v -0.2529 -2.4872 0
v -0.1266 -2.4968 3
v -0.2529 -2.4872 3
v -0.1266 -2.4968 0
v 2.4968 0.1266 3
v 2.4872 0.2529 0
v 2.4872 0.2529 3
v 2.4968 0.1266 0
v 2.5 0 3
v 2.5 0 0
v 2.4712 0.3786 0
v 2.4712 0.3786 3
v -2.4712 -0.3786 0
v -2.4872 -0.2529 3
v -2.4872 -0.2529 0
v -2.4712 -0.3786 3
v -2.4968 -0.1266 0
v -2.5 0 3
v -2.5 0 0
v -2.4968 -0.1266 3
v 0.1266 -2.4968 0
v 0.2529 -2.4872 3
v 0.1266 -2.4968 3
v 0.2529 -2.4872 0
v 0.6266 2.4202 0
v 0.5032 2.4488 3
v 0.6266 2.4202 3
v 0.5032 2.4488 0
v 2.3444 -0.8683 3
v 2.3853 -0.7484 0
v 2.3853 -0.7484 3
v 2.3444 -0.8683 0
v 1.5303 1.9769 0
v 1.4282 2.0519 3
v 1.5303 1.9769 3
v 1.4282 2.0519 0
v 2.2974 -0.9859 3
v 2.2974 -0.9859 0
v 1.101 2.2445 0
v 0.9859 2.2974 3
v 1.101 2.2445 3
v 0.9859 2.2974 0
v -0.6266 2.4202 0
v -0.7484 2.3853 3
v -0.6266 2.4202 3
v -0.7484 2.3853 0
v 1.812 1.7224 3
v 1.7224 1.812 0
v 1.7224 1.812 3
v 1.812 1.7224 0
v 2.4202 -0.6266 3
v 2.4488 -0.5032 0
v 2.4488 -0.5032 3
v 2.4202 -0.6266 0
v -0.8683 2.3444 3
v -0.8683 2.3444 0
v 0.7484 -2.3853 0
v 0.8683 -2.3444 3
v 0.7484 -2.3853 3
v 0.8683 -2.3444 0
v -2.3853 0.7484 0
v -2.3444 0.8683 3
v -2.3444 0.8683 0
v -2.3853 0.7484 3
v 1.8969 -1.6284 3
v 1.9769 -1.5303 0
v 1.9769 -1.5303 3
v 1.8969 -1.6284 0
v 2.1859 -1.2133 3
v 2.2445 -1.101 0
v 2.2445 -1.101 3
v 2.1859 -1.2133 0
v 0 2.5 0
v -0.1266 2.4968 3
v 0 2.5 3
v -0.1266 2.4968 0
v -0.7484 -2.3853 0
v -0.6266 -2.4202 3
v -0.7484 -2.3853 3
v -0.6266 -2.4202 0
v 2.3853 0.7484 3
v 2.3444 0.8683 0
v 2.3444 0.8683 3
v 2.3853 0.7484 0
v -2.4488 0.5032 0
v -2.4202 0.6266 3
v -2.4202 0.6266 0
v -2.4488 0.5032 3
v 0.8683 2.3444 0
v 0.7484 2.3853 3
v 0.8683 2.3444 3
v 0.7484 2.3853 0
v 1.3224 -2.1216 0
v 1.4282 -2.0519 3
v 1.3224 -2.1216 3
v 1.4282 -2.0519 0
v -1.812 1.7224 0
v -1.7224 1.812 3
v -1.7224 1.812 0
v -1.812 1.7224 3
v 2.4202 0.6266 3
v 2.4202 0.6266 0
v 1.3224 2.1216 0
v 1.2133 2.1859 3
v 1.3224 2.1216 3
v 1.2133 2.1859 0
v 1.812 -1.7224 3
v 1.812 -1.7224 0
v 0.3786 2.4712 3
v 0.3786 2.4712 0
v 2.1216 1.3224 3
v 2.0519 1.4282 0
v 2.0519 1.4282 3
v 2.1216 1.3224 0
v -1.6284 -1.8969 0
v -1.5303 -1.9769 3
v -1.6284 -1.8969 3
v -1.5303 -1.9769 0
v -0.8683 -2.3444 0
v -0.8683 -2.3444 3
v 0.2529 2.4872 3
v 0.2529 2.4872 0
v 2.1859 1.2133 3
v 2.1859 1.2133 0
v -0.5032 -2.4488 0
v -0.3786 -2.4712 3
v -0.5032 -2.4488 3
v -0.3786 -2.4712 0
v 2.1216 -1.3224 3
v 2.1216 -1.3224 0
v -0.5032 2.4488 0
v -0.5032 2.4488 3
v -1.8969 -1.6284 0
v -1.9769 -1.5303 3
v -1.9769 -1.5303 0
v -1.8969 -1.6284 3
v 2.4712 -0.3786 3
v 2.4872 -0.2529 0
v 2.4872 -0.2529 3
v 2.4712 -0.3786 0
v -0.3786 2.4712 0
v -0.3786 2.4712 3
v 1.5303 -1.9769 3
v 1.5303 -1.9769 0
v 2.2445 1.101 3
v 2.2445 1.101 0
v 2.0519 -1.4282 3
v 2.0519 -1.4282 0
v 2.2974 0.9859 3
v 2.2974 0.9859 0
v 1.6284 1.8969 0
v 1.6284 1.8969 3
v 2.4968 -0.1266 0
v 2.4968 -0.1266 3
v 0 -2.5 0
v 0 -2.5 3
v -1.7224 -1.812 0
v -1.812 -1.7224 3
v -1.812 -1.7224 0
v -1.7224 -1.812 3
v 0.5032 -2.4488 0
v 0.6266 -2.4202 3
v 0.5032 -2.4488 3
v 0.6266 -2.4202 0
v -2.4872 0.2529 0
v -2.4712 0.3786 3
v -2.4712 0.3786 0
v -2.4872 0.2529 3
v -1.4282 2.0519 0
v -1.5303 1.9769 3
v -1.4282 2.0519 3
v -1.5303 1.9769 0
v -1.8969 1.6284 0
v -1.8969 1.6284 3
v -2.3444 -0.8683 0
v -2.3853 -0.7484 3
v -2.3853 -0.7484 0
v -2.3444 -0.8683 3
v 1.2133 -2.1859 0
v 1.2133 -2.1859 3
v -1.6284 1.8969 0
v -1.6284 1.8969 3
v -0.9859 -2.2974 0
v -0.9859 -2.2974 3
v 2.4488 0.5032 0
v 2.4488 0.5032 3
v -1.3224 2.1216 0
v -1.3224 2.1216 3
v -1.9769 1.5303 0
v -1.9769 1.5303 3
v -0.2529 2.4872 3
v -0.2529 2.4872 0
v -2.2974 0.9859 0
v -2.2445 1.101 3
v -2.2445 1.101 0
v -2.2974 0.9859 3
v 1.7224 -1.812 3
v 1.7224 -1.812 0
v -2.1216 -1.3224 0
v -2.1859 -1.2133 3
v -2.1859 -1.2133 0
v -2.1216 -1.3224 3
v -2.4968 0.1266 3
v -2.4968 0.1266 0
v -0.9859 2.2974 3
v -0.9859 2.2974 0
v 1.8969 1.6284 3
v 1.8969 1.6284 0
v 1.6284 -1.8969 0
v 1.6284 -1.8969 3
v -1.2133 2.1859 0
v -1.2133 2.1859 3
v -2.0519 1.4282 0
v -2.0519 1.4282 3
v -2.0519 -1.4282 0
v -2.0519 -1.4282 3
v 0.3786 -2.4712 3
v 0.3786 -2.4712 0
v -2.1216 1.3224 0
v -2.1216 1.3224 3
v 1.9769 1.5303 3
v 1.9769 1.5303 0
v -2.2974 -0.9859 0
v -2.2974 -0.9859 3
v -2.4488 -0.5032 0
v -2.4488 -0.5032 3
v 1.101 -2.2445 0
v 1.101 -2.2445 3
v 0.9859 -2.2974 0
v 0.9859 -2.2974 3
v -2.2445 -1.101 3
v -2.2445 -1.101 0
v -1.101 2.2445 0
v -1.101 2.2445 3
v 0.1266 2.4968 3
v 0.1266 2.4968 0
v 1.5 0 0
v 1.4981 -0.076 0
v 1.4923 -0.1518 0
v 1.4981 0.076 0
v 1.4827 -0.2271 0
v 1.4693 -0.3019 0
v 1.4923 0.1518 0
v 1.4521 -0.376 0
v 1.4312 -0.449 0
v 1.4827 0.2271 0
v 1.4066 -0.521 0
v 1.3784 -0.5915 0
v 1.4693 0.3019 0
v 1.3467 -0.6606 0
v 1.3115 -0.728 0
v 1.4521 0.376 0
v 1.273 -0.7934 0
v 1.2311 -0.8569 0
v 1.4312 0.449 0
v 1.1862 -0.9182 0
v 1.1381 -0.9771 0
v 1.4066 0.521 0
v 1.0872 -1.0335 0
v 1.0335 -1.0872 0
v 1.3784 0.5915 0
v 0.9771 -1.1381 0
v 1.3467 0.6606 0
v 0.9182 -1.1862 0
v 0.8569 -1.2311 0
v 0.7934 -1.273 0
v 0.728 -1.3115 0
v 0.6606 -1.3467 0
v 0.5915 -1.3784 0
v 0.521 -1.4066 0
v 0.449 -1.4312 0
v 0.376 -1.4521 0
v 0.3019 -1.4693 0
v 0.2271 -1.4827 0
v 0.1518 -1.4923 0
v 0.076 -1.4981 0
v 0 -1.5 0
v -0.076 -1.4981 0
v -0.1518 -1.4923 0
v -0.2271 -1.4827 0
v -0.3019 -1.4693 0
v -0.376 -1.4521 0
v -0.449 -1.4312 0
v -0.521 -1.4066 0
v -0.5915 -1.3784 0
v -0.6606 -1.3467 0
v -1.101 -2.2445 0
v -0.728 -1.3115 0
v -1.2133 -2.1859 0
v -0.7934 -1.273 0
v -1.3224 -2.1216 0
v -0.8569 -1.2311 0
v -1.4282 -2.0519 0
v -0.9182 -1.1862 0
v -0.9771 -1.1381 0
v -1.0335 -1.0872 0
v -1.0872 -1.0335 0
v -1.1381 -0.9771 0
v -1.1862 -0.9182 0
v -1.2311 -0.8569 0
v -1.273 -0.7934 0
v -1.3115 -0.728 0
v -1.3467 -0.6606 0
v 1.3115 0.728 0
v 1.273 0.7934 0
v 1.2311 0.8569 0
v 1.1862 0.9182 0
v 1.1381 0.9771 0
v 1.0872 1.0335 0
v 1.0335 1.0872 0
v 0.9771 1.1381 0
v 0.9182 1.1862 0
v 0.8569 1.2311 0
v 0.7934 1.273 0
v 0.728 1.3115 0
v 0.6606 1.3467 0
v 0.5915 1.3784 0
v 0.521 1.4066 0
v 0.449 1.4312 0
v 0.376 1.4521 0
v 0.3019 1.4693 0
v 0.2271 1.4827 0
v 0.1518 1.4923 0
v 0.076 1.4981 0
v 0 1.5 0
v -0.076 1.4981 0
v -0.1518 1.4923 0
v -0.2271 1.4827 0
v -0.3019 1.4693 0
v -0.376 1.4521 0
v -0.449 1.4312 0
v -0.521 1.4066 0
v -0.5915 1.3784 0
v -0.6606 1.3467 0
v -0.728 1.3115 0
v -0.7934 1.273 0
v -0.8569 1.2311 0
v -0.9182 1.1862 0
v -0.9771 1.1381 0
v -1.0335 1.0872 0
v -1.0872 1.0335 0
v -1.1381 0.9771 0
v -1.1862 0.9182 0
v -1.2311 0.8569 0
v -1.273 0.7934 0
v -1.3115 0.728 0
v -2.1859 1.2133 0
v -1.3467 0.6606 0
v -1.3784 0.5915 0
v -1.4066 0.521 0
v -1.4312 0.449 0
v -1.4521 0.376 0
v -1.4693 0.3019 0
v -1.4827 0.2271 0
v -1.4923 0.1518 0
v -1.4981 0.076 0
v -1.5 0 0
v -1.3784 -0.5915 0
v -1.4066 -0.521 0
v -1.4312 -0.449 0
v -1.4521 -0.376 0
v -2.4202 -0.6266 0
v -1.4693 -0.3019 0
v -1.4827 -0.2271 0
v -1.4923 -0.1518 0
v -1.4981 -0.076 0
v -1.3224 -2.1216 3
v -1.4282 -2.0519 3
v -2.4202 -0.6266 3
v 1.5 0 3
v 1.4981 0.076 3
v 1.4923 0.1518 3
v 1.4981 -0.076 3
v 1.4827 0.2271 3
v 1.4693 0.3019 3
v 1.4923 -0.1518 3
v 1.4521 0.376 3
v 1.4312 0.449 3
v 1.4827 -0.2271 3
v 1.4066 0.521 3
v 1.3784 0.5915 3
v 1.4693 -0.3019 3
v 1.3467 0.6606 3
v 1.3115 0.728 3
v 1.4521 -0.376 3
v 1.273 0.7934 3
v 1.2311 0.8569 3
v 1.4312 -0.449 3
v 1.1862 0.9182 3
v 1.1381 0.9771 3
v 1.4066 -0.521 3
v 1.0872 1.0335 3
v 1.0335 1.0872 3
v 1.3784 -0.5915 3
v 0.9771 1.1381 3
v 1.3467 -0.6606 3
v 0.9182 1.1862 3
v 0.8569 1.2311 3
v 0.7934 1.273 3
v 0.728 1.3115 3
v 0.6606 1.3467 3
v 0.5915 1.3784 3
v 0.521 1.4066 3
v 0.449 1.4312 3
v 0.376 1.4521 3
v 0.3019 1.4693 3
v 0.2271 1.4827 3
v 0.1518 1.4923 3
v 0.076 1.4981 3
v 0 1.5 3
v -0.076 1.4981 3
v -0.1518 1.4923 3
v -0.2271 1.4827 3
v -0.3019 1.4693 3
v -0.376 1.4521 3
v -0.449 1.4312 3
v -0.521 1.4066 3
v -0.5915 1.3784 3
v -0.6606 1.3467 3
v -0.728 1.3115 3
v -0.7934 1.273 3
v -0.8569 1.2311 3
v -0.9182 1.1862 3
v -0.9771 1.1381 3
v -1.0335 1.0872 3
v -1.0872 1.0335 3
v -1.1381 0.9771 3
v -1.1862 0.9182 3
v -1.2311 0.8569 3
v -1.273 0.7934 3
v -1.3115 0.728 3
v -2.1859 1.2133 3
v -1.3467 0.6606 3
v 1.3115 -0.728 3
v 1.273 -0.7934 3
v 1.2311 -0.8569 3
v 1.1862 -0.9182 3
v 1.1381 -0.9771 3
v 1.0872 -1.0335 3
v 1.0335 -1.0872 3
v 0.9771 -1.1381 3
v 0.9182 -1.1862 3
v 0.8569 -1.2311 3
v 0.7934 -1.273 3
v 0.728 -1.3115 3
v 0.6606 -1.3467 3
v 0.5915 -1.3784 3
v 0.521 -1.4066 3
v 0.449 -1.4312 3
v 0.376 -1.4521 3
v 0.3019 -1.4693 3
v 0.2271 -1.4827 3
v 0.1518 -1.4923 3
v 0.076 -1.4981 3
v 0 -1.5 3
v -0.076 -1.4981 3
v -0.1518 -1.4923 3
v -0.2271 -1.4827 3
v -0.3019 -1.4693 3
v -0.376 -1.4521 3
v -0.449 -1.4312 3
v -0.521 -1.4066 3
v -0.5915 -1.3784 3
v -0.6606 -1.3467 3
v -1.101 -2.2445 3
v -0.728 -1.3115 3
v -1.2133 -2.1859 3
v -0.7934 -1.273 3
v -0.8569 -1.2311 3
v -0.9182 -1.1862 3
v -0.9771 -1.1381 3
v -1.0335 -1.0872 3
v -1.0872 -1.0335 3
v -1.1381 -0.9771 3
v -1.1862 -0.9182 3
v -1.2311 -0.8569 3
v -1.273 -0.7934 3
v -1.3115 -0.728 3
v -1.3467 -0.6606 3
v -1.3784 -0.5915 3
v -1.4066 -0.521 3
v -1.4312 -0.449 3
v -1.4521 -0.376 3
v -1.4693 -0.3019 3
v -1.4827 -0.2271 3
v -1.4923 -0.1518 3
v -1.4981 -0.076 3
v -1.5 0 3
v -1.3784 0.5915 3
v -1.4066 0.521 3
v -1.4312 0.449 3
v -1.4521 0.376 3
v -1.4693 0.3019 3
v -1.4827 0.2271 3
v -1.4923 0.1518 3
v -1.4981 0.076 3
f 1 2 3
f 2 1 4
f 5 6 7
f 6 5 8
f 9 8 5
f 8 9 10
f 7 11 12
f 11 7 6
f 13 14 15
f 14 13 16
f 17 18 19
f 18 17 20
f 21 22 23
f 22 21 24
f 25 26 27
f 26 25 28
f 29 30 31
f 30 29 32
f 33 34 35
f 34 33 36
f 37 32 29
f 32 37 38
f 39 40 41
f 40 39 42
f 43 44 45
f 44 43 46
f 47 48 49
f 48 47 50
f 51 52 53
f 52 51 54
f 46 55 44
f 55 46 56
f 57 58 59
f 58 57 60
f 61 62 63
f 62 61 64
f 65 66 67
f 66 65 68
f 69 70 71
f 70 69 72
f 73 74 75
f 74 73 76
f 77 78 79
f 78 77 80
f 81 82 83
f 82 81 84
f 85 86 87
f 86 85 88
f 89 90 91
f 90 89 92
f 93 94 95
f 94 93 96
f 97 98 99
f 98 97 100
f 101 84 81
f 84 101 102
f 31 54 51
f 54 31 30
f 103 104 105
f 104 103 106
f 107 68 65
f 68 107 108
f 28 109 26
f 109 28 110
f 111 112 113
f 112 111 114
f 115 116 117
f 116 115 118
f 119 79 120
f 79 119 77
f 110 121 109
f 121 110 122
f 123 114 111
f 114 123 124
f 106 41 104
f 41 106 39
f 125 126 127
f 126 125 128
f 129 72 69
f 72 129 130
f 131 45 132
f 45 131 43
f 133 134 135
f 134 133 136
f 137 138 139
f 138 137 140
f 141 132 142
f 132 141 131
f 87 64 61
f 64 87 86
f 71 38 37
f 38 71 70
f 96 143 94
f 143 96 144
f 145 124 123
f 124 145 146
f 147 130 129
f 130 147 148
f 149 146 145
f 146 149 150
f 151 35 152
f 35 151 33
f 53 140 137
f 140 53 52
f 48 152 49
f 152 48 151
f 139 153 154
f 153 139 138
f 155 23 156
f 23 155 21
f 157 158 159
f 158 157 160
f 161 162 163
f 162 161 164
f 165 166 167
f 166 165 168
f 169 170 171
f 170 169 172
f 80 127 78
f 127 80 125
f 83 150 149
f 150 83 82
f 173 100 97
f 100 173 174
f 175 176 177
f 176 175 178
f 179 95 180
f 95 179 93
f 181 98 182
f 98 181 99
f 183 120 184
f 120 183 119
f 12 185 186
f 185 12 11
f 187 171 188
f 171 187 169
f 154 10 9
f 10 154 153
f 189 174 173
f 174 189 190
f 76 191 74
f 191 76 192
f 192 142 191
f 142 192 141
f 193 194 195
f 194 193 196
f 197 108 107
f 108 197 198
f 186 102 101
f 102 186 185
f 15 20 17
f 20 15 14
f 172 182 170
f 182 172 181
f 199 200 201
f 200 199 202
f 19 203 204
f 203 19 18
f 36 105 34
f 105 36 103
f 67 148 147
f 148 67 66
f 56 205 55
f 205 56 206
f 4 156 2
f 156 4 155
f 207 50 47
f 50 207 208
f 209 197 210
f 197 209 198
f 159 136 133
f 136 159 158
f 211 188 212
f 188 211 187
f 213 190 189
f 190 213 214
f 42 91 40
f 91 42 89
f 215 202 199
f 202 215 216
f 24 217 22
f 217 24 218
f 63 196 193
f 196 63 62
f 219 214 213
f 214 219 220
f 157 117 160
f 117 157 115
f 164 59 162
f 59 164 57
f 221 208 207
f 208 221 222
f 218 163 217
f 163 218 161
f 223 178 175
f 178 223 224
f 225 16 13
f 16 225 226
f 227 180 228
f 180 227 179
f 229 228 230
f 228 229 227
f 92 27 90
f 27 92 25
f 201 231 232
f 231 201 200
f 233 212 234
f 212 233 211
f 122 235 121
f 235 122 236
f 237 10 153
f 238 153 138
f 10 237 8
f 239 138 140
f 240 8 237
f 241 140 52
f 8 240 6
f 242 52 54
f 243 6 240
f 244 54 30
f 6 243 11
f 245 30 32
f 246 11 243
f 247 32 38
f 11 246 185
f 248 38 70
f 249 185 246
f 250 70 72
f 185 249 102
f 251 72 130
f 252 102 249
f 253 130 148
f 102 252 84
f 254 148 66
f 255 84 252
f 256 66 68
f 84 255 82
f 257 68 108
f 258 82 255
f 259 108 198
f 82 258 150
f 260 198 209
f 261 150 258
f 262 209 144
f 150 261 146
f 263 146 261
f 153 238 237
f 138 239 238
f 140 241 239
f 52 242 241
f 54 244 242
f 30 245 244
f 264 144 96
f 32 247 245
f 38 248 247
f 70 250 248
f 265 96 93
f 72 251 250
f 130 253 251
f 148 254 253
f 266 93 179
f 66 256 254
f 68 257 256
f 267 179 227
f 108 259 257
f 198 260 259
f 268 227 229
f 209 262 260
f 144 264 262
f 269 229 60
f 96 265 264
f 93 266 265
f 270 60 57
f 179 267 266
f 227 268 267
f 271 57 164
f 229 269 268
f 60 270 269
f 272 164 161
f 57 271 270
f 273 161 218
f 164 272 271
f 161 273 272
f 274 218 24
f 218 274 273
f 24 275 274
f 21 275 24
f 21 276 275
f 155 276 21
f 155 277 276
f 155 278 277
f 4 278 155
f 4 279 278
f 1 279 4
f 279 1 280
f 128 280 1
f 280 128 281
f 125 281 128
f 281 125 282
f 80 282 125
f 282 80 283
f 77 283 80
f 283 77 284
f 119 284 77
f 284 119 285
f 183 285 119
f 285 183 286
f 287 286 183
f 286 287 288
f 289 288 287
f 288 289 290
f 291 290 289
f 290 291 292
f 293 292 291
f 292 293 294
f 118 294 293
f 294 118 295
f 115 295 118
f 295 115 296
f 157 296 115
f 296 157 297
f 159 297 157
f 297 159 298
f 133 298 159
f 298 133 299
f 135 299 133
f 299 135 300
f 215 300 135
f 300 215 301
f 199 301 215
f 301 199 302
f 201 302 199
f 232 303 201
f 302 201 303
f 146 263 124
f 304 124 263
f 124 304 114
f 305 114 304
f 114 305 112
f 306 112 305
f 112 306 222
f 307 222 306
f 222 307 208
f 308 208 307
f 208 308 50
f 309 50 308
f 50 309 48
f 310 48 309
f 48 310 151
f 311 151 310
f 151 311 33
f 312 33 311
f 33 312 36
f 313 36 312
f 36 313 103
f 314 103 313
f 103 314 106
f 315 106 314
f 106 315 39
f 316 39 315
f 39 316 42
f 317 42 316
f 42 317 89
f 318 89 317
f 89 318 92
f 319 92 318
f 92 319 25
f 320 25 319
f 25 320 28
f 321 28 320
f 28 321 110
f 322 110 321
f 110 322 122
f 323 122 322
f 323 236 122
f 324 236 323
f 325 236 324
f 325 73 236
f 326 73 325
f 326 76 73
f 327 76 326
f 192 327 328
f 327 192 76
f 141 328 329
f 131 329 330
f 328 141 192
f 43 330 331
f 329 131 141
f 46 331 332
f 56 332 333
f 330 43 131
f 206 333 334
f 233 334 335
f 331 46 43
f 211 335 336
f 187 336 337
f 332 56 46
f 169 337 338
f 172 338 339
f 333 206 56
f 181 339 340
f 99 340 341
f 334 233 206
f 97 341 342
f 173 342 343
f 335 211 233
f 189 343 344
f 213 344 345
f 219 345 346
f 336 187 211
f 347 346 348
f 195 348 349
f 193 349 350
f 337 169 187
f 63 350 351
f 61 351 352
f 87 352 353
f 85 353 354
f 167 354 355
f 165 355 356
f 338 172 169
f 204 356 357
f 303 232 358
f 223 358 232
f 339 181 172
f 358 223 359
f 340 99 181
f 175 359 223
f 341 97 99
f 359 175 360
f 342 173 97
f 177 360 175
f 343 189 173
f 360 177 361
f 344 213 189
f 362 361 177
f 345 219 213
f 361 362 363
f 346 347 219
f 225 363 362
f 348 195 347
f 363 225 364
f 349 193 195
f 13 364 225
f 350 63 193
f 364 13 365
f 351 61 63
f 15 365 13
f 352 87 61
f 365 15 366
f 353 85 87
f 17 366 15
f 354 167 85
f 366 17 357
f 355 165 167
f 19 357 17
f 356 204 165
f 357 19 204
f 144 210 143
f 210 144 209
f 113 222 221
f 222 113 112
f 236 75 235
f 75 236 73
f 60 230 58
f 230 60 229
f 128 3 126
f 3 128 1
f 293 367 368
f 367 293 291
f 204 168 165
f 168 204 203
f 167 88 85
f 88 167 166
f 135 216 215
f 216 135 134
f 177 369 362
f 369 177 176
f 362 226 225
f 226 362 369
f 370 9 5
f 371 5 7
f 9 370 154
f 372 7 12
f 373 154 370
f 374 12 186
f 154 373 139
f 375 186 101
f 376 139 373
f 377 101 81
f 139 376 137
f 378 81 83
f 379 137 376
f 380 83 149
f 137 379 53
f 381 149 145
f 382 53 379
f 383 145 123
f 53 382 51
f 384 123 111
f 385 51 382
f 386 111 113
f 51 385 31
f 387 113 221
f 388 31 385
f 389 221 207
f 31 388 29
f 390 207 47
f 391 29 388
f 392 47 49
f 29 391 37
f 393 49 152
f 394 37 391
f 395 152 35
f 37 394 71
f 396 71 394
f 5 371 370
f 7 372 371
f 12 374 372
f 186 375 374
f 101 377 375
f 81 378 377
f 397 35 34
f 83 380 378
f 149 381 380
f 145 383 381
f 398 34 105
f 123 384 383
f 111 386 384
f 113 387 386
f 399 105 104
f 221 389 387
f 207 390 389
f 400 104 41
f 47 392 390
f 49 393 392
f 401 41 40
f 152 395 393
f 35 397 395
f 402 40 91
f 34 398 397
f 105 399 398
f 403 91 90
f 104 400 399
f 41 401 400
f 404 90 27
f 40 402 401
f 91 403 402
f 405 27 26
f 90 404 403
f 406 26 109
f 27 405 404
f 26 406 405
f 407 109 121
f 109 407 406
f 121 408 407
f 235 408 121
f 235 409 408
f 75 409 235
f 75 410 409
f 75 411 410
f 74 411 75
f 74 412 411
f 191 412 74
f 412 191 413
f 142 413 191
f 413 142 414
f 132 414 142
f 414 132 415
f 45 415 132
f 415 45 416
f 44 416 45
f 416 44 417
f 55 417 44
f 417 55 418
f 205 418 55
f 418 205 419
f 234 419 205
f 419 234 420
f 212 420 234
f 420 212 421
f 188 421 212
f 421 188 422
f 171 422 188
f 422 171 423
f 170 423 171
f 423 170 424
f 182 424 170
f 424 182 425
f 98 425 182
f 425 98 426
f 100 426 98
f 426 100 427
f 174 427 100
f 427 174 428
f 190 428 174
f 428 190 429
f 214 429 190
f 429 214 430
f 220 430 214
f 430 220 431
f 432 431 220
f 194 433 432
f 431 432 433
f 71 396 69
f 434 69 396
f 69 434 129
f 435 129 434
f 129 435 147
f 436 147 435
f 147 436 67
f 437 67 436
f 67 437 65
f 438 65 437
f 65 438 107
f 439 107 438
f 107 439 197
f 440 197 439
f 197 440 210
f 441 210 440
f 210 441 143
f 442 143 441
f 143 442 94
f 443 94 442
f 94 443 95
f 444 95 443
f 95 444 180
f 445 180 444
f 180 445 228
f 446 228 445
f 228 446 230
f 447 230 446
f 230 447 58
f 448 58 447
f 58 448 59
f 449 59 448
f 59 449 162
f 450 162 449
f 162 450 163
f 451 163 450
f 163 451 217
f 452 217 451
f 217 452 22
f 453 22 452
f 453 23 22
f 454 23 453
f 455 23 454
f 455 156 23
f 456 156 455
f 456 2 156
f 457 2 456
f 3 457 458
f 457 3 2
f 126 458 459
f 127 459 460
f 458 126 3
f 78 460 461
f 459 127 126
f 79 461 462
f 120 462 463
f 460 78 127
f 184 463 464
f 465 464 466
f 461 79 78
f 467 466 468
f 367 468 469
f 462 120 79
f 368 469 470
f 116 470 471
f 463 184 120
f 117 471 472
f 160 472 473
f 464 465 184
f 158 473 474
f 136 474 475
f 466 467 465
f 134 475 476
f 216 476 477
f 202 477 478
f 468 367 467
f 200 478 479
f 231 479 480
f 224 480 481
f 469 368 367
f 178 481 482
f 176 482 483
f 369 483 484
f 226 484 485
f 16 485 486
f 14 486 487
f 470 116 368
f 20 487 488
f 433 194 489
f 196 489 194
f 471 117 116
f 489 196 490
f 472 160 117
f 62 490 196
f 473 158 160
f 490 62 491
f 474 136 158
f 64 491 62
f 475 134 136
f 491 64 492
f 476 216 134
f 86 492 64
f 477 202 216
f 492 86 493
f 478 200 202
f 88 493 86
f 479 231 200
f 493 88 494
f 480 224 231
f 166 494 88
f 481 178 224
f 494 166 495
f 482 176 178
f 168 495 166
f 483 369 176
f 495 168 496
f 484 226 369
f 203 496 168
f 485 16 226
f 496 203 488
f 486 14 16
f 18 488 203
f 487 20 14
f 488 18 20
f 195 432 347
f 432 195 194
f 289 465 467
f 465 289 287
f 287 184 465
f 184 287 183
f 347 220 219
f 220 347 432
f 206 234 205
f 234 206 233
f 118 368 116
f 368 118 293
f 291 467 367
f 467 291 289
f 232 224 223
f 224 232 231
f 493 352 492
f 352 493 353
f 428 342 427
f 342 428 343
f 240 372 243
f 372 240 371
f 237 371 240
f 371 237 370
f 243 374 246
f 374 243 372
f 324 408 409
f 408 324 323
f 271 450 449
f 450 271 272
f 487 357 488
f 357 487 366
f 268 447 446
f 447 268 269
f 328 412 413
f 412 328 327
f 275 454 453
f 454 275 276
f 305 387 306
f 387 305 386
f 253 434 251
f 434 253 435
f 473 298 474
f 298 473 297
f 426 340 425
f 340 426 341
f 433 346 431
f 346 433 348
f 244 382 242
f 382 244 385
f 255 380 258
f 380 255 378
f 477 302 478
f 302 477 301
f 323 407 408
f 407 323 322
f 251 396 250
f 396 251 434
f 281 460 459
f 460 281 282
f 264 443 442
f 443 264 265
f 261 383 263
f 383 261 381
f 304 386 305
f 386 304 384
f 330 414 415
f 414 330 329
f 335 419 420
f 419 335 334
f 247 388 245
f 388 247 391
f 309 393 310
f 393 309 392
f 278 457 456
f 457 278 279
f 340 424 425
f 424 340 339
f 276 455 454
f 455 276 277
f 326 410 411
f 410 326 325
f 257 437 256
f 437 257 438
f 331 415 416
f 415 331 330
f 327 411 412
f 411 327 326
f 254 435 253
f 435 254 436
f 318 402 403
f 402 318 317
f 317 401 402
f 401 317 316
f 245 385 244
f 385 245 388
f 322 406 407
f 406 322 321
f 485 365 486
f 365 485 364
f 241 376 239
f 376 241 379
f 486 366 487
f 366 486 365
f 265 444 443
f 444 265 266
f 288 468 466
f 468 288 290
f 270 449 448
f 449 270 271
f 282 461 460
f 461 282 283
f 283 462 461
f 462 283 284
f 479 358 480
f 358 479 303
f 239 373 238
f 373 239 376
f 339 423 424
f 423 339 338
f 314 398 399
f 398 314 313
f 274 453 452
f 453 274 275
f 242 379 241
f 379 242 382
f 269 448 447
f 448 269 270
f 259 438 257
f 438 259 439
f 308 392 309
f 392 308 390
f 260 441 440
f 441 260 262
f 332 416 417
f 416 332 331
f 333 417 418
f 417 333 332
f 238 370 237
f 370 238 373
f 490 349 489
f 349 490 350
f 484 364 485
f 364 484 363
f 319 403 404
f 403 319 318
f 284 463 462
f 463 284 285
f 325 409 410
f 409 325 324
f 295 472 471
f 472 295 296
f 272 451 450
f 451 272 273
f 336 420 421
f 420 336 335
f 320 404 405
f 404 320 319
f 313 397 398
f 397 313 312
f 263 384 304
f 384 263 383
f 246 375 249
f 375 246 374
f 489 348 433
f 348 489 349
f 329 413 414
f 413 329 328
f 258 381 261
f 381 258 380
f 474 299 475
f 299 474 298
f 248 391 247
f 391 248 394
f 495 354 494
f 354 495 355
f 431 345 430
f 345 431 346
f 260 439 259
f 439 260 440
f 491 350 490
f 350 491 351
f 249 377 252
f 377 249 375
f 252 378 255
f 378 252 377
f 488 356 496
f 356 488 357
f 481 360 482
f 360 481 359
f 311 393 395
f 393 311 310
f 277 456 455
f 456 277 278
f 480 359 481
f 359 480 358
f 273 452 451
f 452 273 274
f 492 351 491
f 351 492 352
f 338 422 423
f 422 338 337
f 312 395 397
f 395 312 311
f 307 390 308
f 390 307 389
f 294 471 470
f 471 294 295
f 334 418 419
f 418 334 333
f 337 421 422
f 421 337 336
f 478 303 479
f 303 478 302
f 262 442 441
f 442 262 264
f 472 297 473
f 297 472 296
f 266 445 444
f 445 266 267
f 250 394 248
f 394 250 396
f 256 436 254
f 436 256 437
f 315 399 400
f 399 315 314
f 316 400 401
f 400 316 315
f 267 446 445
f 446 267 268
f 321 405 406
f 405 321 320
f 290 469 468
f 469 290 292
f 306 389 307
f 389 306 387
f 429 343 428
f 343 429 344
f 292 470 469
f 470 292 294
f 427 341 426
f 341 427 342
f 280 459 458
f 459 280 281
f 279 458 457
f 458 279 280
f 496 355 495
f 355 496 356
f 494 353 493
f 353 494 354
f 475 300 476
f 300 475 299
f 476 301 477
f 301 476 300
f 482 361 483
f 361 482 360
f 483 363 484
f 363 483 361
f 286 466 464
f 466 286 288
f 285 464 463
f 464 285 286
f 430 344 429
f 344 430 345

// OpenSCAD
// file: RPi4board-modded.scad
//------------------------------------------------------------------------
// OpenSCAD models of miscellaneous components and devices:
// various Raspberry Pi models, SainSmart Relays, PCD8544 LCD, etc.
//
// Author:      Niccolo Rigacci <niccolo@rigacci.org>
// Version:     1.0 2017-12-14
// License:     GNU General Public License v3.0
// Modified:    by Richard Jelbert 5th January 2021 for RPi 4
//------------------------------------------------------------------------

// Interference for 3D union(), difference() and intersection();
// used to avoid the manifold problem.
interf = 0.2;

//------------------------------------------------------------------------
// Matrix of 2.54 mm pins.
//------------------------------------------------------------------------
module pin_headers(cols, rows) {
    w = 2.54; h = 2.54; p = 0.65;
    for(x = [0 : (cols -1)]) {
        for(y = [0 : (rows  - 1)]) {
            translate([w * x, w * y, 0]) {
                union() {
                    color("black") cube([w, w, h]);
                    //color("gold")  translate([(w - p) / 2, (w - p) / 2, -3]) cube([p, p, 11.54]);
                }
            }
        }
    }
}

//------------------------------------------------------------------------
// Sub-models for the Raspberry Pi 4 Model
//------------------------------------------------------------------------

module ethernet_connector(x, y, z, cut=false) {
    if(!cut) {
        color("silver") cube([x, y, z]);
    }
    if(cut) {
        translate([-0.5,5,-0.5]) color("silver") cube([x+1, y, z+1]);
    }
}
module usb_connector(x, y, z, cut=false) {
    f = 0.6; // Flange
    if(!cut) {
        color("silver") cube([x, y, z]);
        translate([-f, y - f, -f])
            color("silver") cube([x + f * 2, f, z + f * 2]);
    }
    if(cut) {
        //color("silver") cube([x, y, z]);
        translate([-f-0.5, 5, -f-0.5])
            color("silver") cube([x + f * 2+1, y+10, z + f * 2+1]);
    }
}
module hdmi_connector(x, y, z, cut=false) {
    if(!cut) {
        color("silver") cube([x, y, z]);
    }
    if(cut) {
        translate([3,-0.5,-0.5]) color("silver") cube([x+5, y+1, z+1]);
    }
}
module usbc_connector(x, y, z, cut=false) {
    color("silver") cube([x, y, z]);
}
module capacitor(d, h) {
    color("silver") cylinder(r=(d / 2), h=h);
}
module micro_sd_card() {
    color("silver")   translate([1.5,  0.0, -1.5]) cube([12, 12.5, 1.5]);
    color("orange") translate([2, -3.2, -1.0]) cube([11, 15, 1.0]);
}
module audio_video(size_x, cut=false) {
    fn = 64;
    if(!cut) {
        color([58/255, 58/255, 58/255]) {
            cube([size_x, 7, 5.6]);
            translate([size_x, 7 / 2, 5.6 / 2]) rotate([0,90,0]) cylinder(d=5.6, h=2.6, $fn = fn);
        }
    }
    if(cut) {
        color([58/255, 58/255, 58/255]) {
            cube([size_x, 7, 5.6]);
            translate([size_x, 7 / 2, 5.6 / 2]) rotate([0,90,0]) cylinder(d=5.6+0.5, h=10, $fn = fn);
        }
    }
}
module cpu() {
    color("silver")
    cube([15,15,2.4]);
}

module ram() {
    color("black")
    cube([15,10.2,1]);
}

module wifi(){
    color("silver")
    cube([12,10,1.5]); 
}   

module cameracon(){
    color("black")
    cube([22,2.5,5.5]);
}


//------------------------------------------------------------------------
// Raspberry Pi 4 Model B
//------------------------------------------------------------------------
//board_raspberrypi_4_model_b(cut=true);
//board_raspberrypi_4_model_b(cut=false);
module board_raspberrypi_4_model_b(cut=false) {
    fn = 64;
    x  = 56;     y = 85;    z = 1.40;  // Measured PCB size
    ex = 15.9; ey = 21.5; ez = 13.5;   // Ethernet port size
    ux = 13.1; uy = 17.1; uz = 15.5;   // Measured USB connector size
    hx = 7.80; hy = 6.5; hz = 3;  // Measured micro HDMI connector size
    mx =  7.60; my =  9; mz = 3.20;  // Measured USB-C power connector size
    // The origin is the lower face of PCB.
    if(!cut) {
        translate([0, 0, z]) {
            
            translate([56-32.5-7.5,3.5+25.75-7.5,0])  cpu();
            translate([56-32.5-7.5,3.5+43.75-7.5,0])  ram();
            translate([7,6.5,0])    wifi();
            translate([(56/2)-12,(4-1.25),0]) cameracon();
            translate([(56)-22.3,(45),0]) cameracon();
            translate([1.0, 7.1, 0])    pin_headers(2, 20);
            translate([x-(ex/2)-45.75, y - ey + 2.1, 0])    ethernet_connector(ex, ey, ez);
            translate([x-(ux/2)-27, 85 - uy + 2.1, 0])  usb_connector(ux, uy, uz);
            translate([x-(ux/2)-9, 85 - uy + 2.1, 0])   usb_connector(ux, uy, uz);
            translate([x - hx + 1.8, (3.5+7.7+14.8-(hy/2)), 0]) hdmi_connector(hx, hy, hz);
            translate([x - hx + 1.8, (3.5+7.7+14.8+13.5-(hy/2)), 0])    hdmi_connector(hx, hy, hz);
            translate([x - 12.8, 50, 0])    audio_video(12.8);
            translate([x - mx + 1, (3.5+7.7-(my/2)), 0])    usbc_connector(mx, my, mz);
            //translate([20.5, 0.8, -z])  micro_sd_card();
            translate([0, 0, -z]) {
                color("green") linear_extrude(height=z)
                    difference() {
                        hull() {
                            translate([  3,   3]) circle(r=3, $fn = fn);
                            translate([x-3,   3]) circle(r=3, $fn = fn);
                            translate([x-3, y-3]) circle(r=3, $fn = fn);
                            translate([  3, y-3]) circle(r=3, $fn = fn);
                        }
                        raspberrypi_4_model_b_holes();
                    }
            }
        }
    }
    
    if(cut) {
       translate([0, 0, z]) {
            translate([x-(ex/2)-45.75, y - ey + 2.1, 0])    ethernet_connector(ex, ey, ez, cut=true);
            translate([x-(ux/2)-27, 85 - uy + 2.1, 0])  usb_connector(ux, uy, uz, cut=true);
            translate([x-(ux/2)-9, 85 - uy + 2.1, 0])   usb_connector(ux, uy, uz, cut=true);
            translate([x - hx + 1.8, (3.5+7.7+14.8-(hy/2)), 0]) hdmi_connector(hx, hy, hz, cut=true);
            translate([x - hx + 1.8, (3.5+7.7+14.8+13.5-(hy/2)), 0])    hdmi_connector(hx, hy, hz, cut=true);
            translate([x - 12.8, 50, 0])    audio_video(12.8, cut=true);
            //translate([x - mx + 1, (3.5+7.7-(my/2)), 0])    usbc_connector(mx, my, mz, cut=true);
       }
   }
}

//------------------------------------------------------------------------
// Holes for Raspberry Pi 4 Model B
//------------------------------------------------------------------------
module raspberrypi_4_model_b_holes() {
    x = 56;
    fn = 64;
    translate([3.5, 3.5])            circle(r=(2.75 / 2), $fn=fn);
    translate([(x - 3.5), 3.5])      circle(r=(2.75 / 2), $fn=fn);
    translate([3.5, 3.5 + 58])       circle(r=(2.75 / 2), $fn=fn);
    translate([(x - 3.5), 3.5 + 58]) circle(r=(2.75 / 2), $fn=fn);
}



//board_raspberrypi_4_model_b();
// main file
$fn=124;
include <RPi4board-modded.scad>;

//render_all_assembled();
module render_all_assembled() {    
   top();
//   translate([4,4.5,5]) raspberry_and_card();
//   bottom();  
}

module render_all_disassembled() {    
    
}


//bottom();
module bottom() {
    difference() {
        union() {
            translate([3.5,3.5,0]) cube([135-1,160-6-1,3]);
            
            //rp4 base
            translate([3.5,24.5,0]) cube([7.5,7,5]);
            translate([3.5,82.5,0]) cube([7.5,7,5]);
            translate([53,24.5,0]) cube([7.5,7,5]);
            translate([53,82.5,0]) cube([7.5,7,5]);
        }
        
        //rp4 holes
        translate([32,51,14])
        rotate([0,0,-90])
        {
            //boreholes for Raspberry Pi
            translate([4, 0, -9.6])
                rotate([0, 0, 0]) {
                translate([-10, 0, 0]) {
                    translate([-58/2,-49/2,-1]) {
                        cylinder(h=7, d=2.75, center=true);
                        translate([0,0,-2.7]) cylinder(h=1.6, r1=2.2, r2=1.4, center=true);
                    }
                    translate([-58/2, 49/2,-1]) {
                        cylinder(h=7, d=2.75, center=true);
                        translate([0,0,-2.7]) cylinder(h=1.6, r1=2.2, r2=1.4, center=true);
                    }
                    translate([ 58/2,-49/2,-1]) {
                        cylinder(h=7, d=2.75, center=true);
                        translate([0,0,-2.7]) cylinder(h=1.6, r1=2.2, r2=1.4, center=true);
                    }
                    translate([ 58/2, 49/2,-1]) {
                        cylinder(h=7, d=2.75, center=true);
                        translate([0,0,-2.7]) cylinder(h=1.6, r1=2.2, r2=1.4, center=true);
                    }
                }
            }
        }
        
        // ventilation gril
        for ( i = [1:1:10]) {
            //render first grill shorter so that there is a space to glue rubber legs
            if (i==1) {
                translate([15+10,5+i*7,-1]) rotate([0,0,-90])
                hull() {
                    cylinder ( h=10,r1=1,r2=1,center=true );
                    translate([0,25,0]) cylinder ( h=10,r1=1,r2=1,center=true );
                }
            } else {
                translate([15,5+i*7,-1]) rotate([0,0,-90])
                hull() {
                    cylinder ( h=10,r1=1,r2=1,center=true );
                    translate([0,35,0]) cylinder ( h=10,r1=1,r2=1,center=true );
                }
            }
        }

        // main holes for scews thatwill connect it to top 
        //translate([7.5,7.5,-1]) cylinder(h=12, r1=1.75, r2=1.75, center=false);
        translate([7.5,160-7.5,-1]) cylinder(h=12, d=2.5, center=false);
        translate([135-1.5,7.5,-1]) cylinder(h=12, d=2.5, center=false);
        translate([135-1.5,160-7.5,-1]) cylinder(h=12, d=2.5, center=false);
        
        //hole enlargement for screw head
        translate([7.5,160-7.5,-0.1]) cylinder(h=1.6, r1=2.2, r2=1.4, center=false);        
        translate([135-1.5,7.5,-0.1]) cylinder(h=1.6, r1=2.2, r2=1.4, center=false);
        translate([135-1.5,160-7.5,-0.1]) cylinder(h=1.6, r1=2.2, r2=1.4, center=false);

    }
}
//display(cut=true);
module display(cut=false) {
    if(!cut) {
        //display is 106x68x8.6
        translate([68,0,0]) rotate([180,0,180])
        color("blue") translate([68/2,106/2,3.35]) rotate([0,0,90]) import("0329.stl", convexity = 5);
    }
    if (cut) {
        translate([-0.5,-0.5,-14])
        union() {
            //screen is 106x68x8.6 but add 1 mm on each side for posible fit
            cube([69, 107, 16]); 
            translate([0.5,0.5,14]) screen_mounting(post_height=6, cut=true);
        }
    }
}

// raspberry 4.3 screen mounting
// mounting screws for case should be 3.75x3.75 mm ouside the each corner 
//screen_mounting();
//screen_mounting(cut=false);
module screen_mounting(post_height=6, cut=false) {

   if(!cut){
       //  display center mounitng is:
       //  DOWN-UP distance from corner of teh screen: "(68-61.8)/2: ", 3.1
       //  LEFT/RIGHT: "(106-99.3)/2: ", 3.35
       difference() {
           union() {
            //top left
            translate([(68-61.8)/2,(106-99.3)/2,-8.6+1]) rotate([180,0,90]) 
                difference() {
                    hull() {
                        cylinder(r=5,h=post_height);
                        translate([-6,-6,0])cylinder(r=5,h=post_height);
                    }
                    translate([0,0,-0.1])cylinder(r=3,h=5);
                    translate([0,0,1])cylinder(r=1.4,h=8);
                    translate([-3,-6.3,5]) rotate([0,0,45]) linear_extrude(height = 3) text("1", font = "Liberation Sans:style=Bold", size = 5);
                }
                
            //top right
            translate([(68-61.8)/2,99.3+(106-99.3)/2,-8.6+1]) rotate([180,0,0])
                difference() {
                    hull() {
                        cylinder(r=5,h=post_height);
                        translate([-6,-6,0])cylinder(r=5,h=post_height);
                    }
                    translate([0,0,-0.1])cylinder(r=3,h=5);
                    translate([0,0,1])cylinder(r=1.4,h=8); 
                    translate([-3,-6.3,5]) rotate([0,0,45]) linear_extrude(height = 3) text("2", font = "Liberation Sans:style=Bold", size = 5);

                }
                
            //bottom right
            translate([61.8+(68-61.8)/2,99.3+(106-99.3)/2,-8.6+1]) rotate([180,0,-90])
                difference() {
                    hull() {
                        cylinder(r=5,h=post_height);
                        translate([-6,-6,0])cylinder(r=5,h=post_height);
                    }
                    translate([0,0,-0.1])cylinder(r=3,h=5);
                    translate([0,0,1])cylinder(r=1.4,h=8);
                   translate([-3,-6.3,5]) rotate([0,0,45]) linear_extrude(height = 3) text("3", font = "Liberation Sans:style=Bold", size = 5); 
                }
                
            // bottom left
            translate([61.8+(68-61.8)/2,(106-99.3)/2,-8.6+1]) rotate([180,0,180]) 
                difference() {
                    hull() {
                        cylinder(r=5,h=post_height);
                        translate([-6,-6,0])cylinder(r=5,h=post_height);
                    }
                    translate([0,0,-0.1])cylinder(r=3,h=5);
                    translate([0,0,1])cylinder(r=1.4,h=8); 
                    translate([-3,-6.3,5]) rotate([0,0,45]) linear_extrude(height = 3) text("4", font = "Liberation Sans:style=Bold", size = 5);
                }
            }
       
            // cut small edges  (1.mm deep) for screen
            //screen is 106x68x8.6mm but add 0.1 on each side
            translate([-0.1,-0.1,-8.6])cube([68.2, 106.2,8.6]);
            
            // mount holes
            //top left hole for mount
            translate([(68-61.8)/2+1,(106-99.3)/2+1,-8.6+1]) rotate([180,0,90]) 
                translate([-7,-7,-1])cylinder(r=1.4,h=8); 
            //top right hole for mount
            translate([(68-61.8)/2+1,99.3+(106-99.3)/2-1,-8.6+1]) rotate([180,0,0])
                    translate([-7,-7,-1])cylinder(r=1.4,h=8); 
            //bottom right hole for mount
            translate([61.8+(68-61.8)/2-1,99.3+(106-99.3)/2-1,-8.6+1]) rotate([180,0,-90])
                    translate([-7,-7,-1])cylinder(r=1.4,h=8);             
            // bottom left hole for mount
            translate([61.8+(68-61.8)/2-1,(106-99.3)/2+1,-8.6+1]) rotate([180,0,180]) 
                    translate([-7,-7,-1])cylinder(r=1.4,h=8);             
        }
    }
    
    if (cut) {
       translate([0,0,6]) {
            // mount holes
            //top left hole for mount
            translate([(68-61.8)/2+1,(106-99.3)/2+1,-8.6+1]) rotate([180,0,90]) 
                translate([-7,-7,-1])cylinder(d=4.5,h=8); 
            //top right hole for mount
            translate([(68-61.8)/2+1,99.3+(106-99.3)/2-1,-8.6+1]) rotate([180,0,0])
                    translate([-7,-7,-1])cylinder(d=4.5,h=8); 
            //bottom right hole for mount
            translate([61.8+(68-61.8)/2-1,99.3+(106-99.3)/2-1,-8.6+1]) rotate([180,0,-90])
                    translate([-7,-7,-1])cylinder(d=4.5,h=8);             
            // bottom left hole for mount
            translate([61.8+(68-61.8)/2-1,(106-99.3)/2+1,-8.6+1]) rotate([180,0,180]) 
                    translate([-7,-7,-1])cylinder(d=4.5,h=8);             
       }
    }
}

//test_display_mounting(mounting=true, showDisplay=true, screenMounting=true);
module test_display_mounting(mounting=true, showDisplay=false, screenMounting=false) {
        if (mounting) {
            difference() {
                //display mounting is 120x85
                translate([-(83-68)/2, -(120-106)/2, -7.6]) cube([83,120,7.6]);
                //display is 106x68 and display cut is 107x69
                display(cut=true);
            }
        }
        if(showDisplay) display(cut=false);
        
        if (screenMounting) {
            screen_mounting();
        }
}

//display_with_raspberry_and_card();
module display_with_raspberry_and_card(){
    translate([68,0,0]) rotate([180,0,180])
    union() {
        //display is 106x68x8.6
        //display post is 4mm
        color("blue") translate([68/2,106/2,3.35]) rotate([0,0,90]) import("0329.stl", convexity = 5);
        translate([9.5-3.5,22.38-3.5,15]) board_raspberrypi_4_model_b();

        // zunthian board is 56x85
        translate([56/2+9.5-3.5,85/2+22.38-3.5,27]) rotate([0,0,90]) audio_card();
    }
}

//raspberry_and_card();
module raspberry_and_card(cut=false){
    translate([56,85,0]) rotate([0,0,180])
    union() {
        board_raspberrypi_4_model_b(cut=cut);

        // zunthian board is 56x85
        //translate([56/2,85/2,12]) rotate([0,0,90]) audio_card();
    }
}

    
    

//top();
module top() {
// zynthian-top.svg is 170 width and 120 height
    difference() {
        union() {
            //case
            difference() {
                case(160, tolerance=3); 
                case_cut(lenght=160, tolerance=3);
            }
            //add a display_mounting
            translate([28.5,(160-120)/2,49.4]) rotate([0,6.99,0]) cube([82,120,7.6]);
            
        }
       
        // carve logo
        translate([13, 0, 58]) rotate([0,7,0]) zynthian_top(cut=false); 
        //carve encoder and screen holes
        translate([13, 0, 58]) rotate([0,7,0]) zynthian_top(cut=true);
       
        // holes for bottom part
        //single hole that goes trough rp4
        translate([32,51,28])
        rotate([0,0,-90])
        {
            //boreholes for Raspberry Pi
            translate([4, 0, -8])
                rotate([0, 0, 0]) {
                translate([-10, 0, 0]) {
                    translate([ 58/2,-49/2,-1])
                    cylinder(h=9, d=4.5, center=true); 
                }
            }
        }
        translate([7.5,160-7.5,-1]) cylinder(h=12, d=4.5, center=false);
        translate([135-1.5,7.5,-1]) cylinder(h=12, d=4.5, center=false);
        translate([135-1.5,160-7.5,-1]) cylinder(h=12, d=4.5, center=false);
        
        //raspberry_pi opening
        translate([32,51,14])
        rotate([0,0,-90])
        {        

            //triming to 2mm wall when connectors are
            translate([-35,-32.1,-10]) cube([57,1.1,11]);
            translate([50,-29,-10]) cube([1.1,57,21]);
            
            // Opening for Ethernet
            translate([48.5, 17.75, -0.65]) rotate([0, 90, 0]) cube([13.9, 16.4, 1.2], center=true);
            translate([49.5, 17.75, -0.65]) rotate([0, 90, 0]) cube([15.9, 18.4, 1.2], center=true);
              
            // Opening for 1. USB A
            translate([48.5, -19, 0.6]) rotate([0, 90, 0]) cube([16.4, 14.9, 1.2], center=true);
            translate([49.5, -19, 0.6]) rotate([0, 90, 0]) cube([18.4, 16.9, 1.2], center=true);

            // Opening for 2. USB A
            translate([48.5, -1, 0.6]) rotate([0, 90, 0]) cube([16.4, 14.9, 1.2], center=true);
            translate([49.5, -1, 0.6]) rotate([0, 90, 0]) cube([18.4, 16.9, 1.2], center=true);

            //Opening for hole for micro USB
            translate([-27.3, -29.5, -5.825]) rotate([90, 0, 0]) cube([9.4, 3.55, 1.2], center=true);
            translate([-27.3, -30.5, -5.825]) rotate([90, 0, 0]) cube([11.4, 5.55, 1.2], center=true);

            //Opening for 1. Micro HDMI
            translate([-12.5, -29.5, -5.9]) rotate([90, 0, 0]) cube([7.9, 3.4, 1.2], center=true);
            translate([-12.5, -30.5, -5.9]) rotate([90, 0, 0]) cube([9.9, 5.4, 1.2], center=true);     
          
            //Opening for  2. Micro HDMI
            translate([1, -29.5, -5.9]) rotate([90, 0, 0]) cube([7.9, 3.4, 1.2], center=true);
            translate([1,  -30.5, -5.9]) rotate([90, 0, 0]) cube([9.9, 5.4, 1.2], center=true);

            //Opening for  Audio
            translate([15.5, -29.5, -4.6]) rotate([90, 0, 0]) cylinder(h = 2, r = 3.2, center=true);
            translate([15.5, -30.5, -4.4]) rotate([90, 0, 0]) cylinder(h = 1.2, r = 4.2, center=true);        
        }
        
        //left side grill       
        for ( i = [1:1:7]) {
            translate([7+i*7,1,30]) rotate([90,0,0])  
                hull() {
                    cylinder ( h=5,r1=1,r2=1,center=true );
                    translate([0,23-i*0.85,0]) cylinder ( h=5,r1=1,r2=1,center=true );
                }
        }
        
        //right side grill       
        for ( i = [1:1:7]) {
            translate([7+i*7,158,10]) rotate([90,0,0])  
                hull() {
                    cylinder ( h=5,r1=1,r2=1,center=true );
                    translate([0,40-i*0.85,0]) cylinder ( h=5,r1=1,r2=1,center=true );
                }
        }
        
        
        translate([0,20,14])
        for ( i = [1:1:12]) {
            translate([2,5+i*5,5]) rotate([90,0,90])  
                hull() {
                    cylinder ( h=5,r1=1,r2=1,center=true );
                    translate([0,8,0]) cylinder ( h=5,r1=1,r2=1,center=true );
                }
        }

        
        //holes for midi connector
        translate([0,132,35]) midi_connector_hole();
        translate([0,132,15]) midi_connector_hole();
        translate([0,102,35]) midi_connector_hole();
        
        //holes for audio RCA
        translate([-2,52,35]) {
            rotate([90,0,90]) cylinder(h=10,r=4.3,center=false);
            translate([0,23.3-8.3,0]) rotate([90,0,90]) cylinder(h=10,r=4.3,center=false);
            translate([0,-(10.15+8.3/2),0]) rotate([90,0,90]) cylinder(h=10,r=1.75,center=false);
            translate([0,23.3+(10.3-8.3/2),0]) rotate([90,0,90]) cylinder(h=10,r=1.75,center=false);
            
        }
        
        //hole for wake up switch
        translate([-1,12,48]) rotate([90,0,90]) cylinder(h=10,d=12, center=false);
        translate([4,12,48]) rotate([90,0,90]) cylinder(h=10,d=7, center=false);
        
        //labels
        translate([1,117,13]) rotate([90,0,-90]) linear_extrude(height = 3) text("MIDI IN", font = "Arial:style=Narrow Bold", size = 4);
        translate([1,142,45]) rotate([90,0,-90]) linear_extrude(height = 3) text("MIDI OUT", font = "Arial:style=Narrow Bold", size = 4);
        translate([1,114,45]) rotate([90,0,-90]) linear_extrude(height = 3) text("MIDI THRU", font = "Arial:style=Narrow Bold", size = 4);
        translate([1,71,42]) rotate([90,0,-90]) linear_extrude(height = 3) text("audio OUT", font = "Arial:style=Narrow Bold", size = 4);
        translate([1,21,37]) rotate([90,0,-90]) linear_extrude(height = 3) text("wake up", font = "Arial:style=Narrow Bold", size = 4);
        translate([1,23,18]) rotate([90,0,-90]) linear_extrude(height = 3) text("STOJOS", font = "Arial:style=Narrow Bold", size = 4);
        translate([1,18,11]) rotate([90,0,-90]) linear_extrude(height = 3) text("V1.0", font = "Arial:style=Narrow Bold", size = 4);
    }
}



module midi_connector_hole() {
        translate([-26,0,0]) rotate([90,0,90]) {
            translate([0,0,25]) cylinder(h=10,d=15.5,center=false);
            //translate([0,0,25]) cylinder(h=10,d=19,center=false);
            translate([-21.5/2,0,25]) cylinder(h=10,r1=2,r2=2,center=false);
            translate([+21.5/2,0,25]) cylinder(h=10,r1=2,r2=2,center=false);  
        }

}

raspberry_mounting();
module raspberry_mounting() {
    difference() {
        cylinder(r=2.5,h=3);
        translate([0,0,-1]) cylinder(r=1.5,h=5);
    }

}


//zynthian_top(cut=true);
// cut: true - render wholes only
module zynthian_top(cut=false) {
    //zynthian logo is 160x120
    if (!cut) {
        translate([125,0,0]) rotate([0,0,90]) linear_extrude(3) import("zynthian-new-v2-top.svg");
    }
    if (cut) {
        //encored cuts from svg file
        translate([125,0,-9 ]) rotate ([0,0,90]) linear_extrude(16) import("zynthian-new-v2-holes.svg");
        //screen and screen holes
        translate([23.434-0.5, (160-107)/2-0.5, -14]) 
        union() {
            //screen is 106x68x8.6 but add 1 mm on each side for posible fit
            cube([69, 107, 16]); 
            translate([0.5,0.5,14]) screen_mounting(post_height=6, cut=true);
        }
        
    }
}



//case_cut(lenght=135, tolerance=3);
module case_cut(lenght=130, tolerance=3) {
    translate([tolerance,tolerance,0]) 
    difference() {
        union() {
              scale([135/(135+2*tolerance),1,57/(57+tolerance)-0.014]) case(lenght=lenght-2*tolerance, tolerance=tolerance);
//            //add a bottom part so that it properly cuts bottom
            translate([0,0,-2]) cube([135,lenght-2*tolerance, 3]);
            
        }
       translate([-1,-1,40]) cube([10,22,60]); 
       translate([-1,20,5+1.6+11]) cube([10,9,60]);
       translate([-1,1+lenght-10-2*tolerance,tolerance]) cube([10,10,60]);
       translate([135-10+1,-1,tolerance]) cube([10,10,50]);
       translate([135-10+1,1+lenght-10-2*tolerance,tolerance]) cube([10,10,50]);
    }

}
            

module case(lenght=200, tolerance=0) {
    translate([0,lenght,0]) rotate ([90,0,0])
    hull() {
        linear_extrude(height = lenght) polygon( points=[[0,0],[0,52+tolerance],[0+5,52+5+tolerance],[135+tolerance*2-5,36+tolerance+5], [135+tolerance*2,36+tolerance],[135+tolerance*2,0]]);
        translate([0+5,52+tolerance,0]) cylinder(h = lenght, r1 = 5, r2 = 5, center = false);
        translate([135+tolerance*2-5,36+tolerance,0]) cylinder(h = lenght, r1 = 5, r2 = 5, center = false);
    }
}

module audio_card(withHeader=false)
{  
  {
    // PCB
    color("DarkSlateGray") difference()
    {
      translate([(65-85)/2,0,0]) hull()
      {
        translate([-(65-6)/2,-(56-6)/2,0]) cylinder(r=3, h=1.4 );
        translate([-(65-6)/2, (56-6)/2,0]) cylinder(r=3, h=1.4 );
        translate([ (65-6)/2,-(56-6)/2,0]) cylinder(r=3, h=1.4 );
        translate([ (65-6)/2, (56-6)/2,0]) cylinder(r=3, h=1.4 );
      }
      
      translate([-85/2+3.5,-49/2,-1]) cylinder(d=2.75, h=3);
      translate([-85/2+3.5, 49/2,-1]) cylinder(d=2.75, h=3);
      translate([58-85/2+3.5,-49/2,-1]) cylinder(d=2.75, h=3);
      translate([58-85/2+3.5, 49/2,-1]) cylinder(d=2.75, h=3);
    }
    
    // Header down
    translate([3.5-85/2+29-10*2.54,49/2-2.54,-8])
      color("darkgrey") cube([2.54*20,5.08,8]);
    
    // Chinch
    translate([-85/2,-56/2,1.4]) 
    {
        
      //21.5

        color("black") translate([21.5-6.75,0,0]) cube([27,10,14]);        
        color("silver") translate([21.5,-9,7.5]) rotate([-90,0,0]) cylinder(d=8,h=9);
        color("silver")  translate([35,-9,7.5]) rotate([-90,0,0]) cylinder(d=8,h=9);
    }
    
    // Header top
    if( withHeader )
      translate([3.5-85/2+29-10*2.54,49/2-2.54-2*2.54,1.4])
        header(20,2);

  }
}


module header(pins, rows)
{
  color("darkgrey") cube([2.54*pins,2.54*rows,1.27]);
  
  for(x=[0:pins-1],y=[0:rows-1])
    translate([x*2.54+(1.27+.6)/2,y*2.54+(1.27+.6)/2,-3.5]) cube([0.6,0.6,11.5]);
}
    

//rpi4case();
module rpi4case()
{
    translate([32,51,14])
    rotate([0,0,-90])
    difference() {
        //main edges
        difference() {
            translate([-50,-32,-14])  cube([101, 63, 29]);
            translate([-52,-29,-9])  cube([100, 62, 25]);
        }
        
        //triming to 2mm wall when connectors are
        translate([-35,-32.1,-10]) cube([57,1.1,11]);
        translate([50,-29,-10]) cube([1.1,57,21]);
        
        // Opening and boreholes for Raspberry Pi
        translate([4, 0, -10])
            rotate([0, 0, 0]) {
            cube([85, 42,3], center=true);
            translate([-10,0,0]) cube([51, 51, 3], center = true);
            translate([32.5,0,0]) cube([20, 51, 3], center = true);

            translate([-10, 0, 0]) {
                translate([-58/2,-49/2,0])
                cylinder(h=2+0.1, d=2.75, center=true);
                translate([-58/2, 49/2,0])
                cylinder(h=2+0.1, d=2.75, center=true);
                translate([ 58/2,-49/2,0])
                cylinder(h=2+0.1, d=2.75, center=true);
                translate([ 58/2, 49/2,0])
                cylinder(h=2+0.1, d=2.75, center=true);
            }
        }

        // Opening for Ethernet
        translate([48.5, 17.75, -0.65]) rotate([0, 90, 0]) cube([13.9, 16.4, 1.2], center=true);
        translate([49.5, 17.75, -0.65]) rotate([0, 90, 0]) cube([15.9, 18.4, 1.2], center=true);
          
        // Opening for 1. USB A
        translate([48.5, -19, 0.6]) rotate([0, 90, 0]) cube([16.4, 14.9, 1.2], center=true);
        translate([49.5, -19, 0.6]) rotate([0, 90, 0]) cube([18.4, 16.9, 1.2], center=true);

        // Opening for 2. USB A
        translate([48.5, -1, 0.6]) rotate([0, 90, 0]) cube([16.4, 14.9, 1.2], center=true);
        translate([49.5, -1, 0.6]) rotate([0, 90, 0]) cube([18.4, 16.9, 1.2], center=true);

        //Opening for hole for micro USB
        translate([-27.3, -29.5, -5.825]) rotate([90, 0, 0]) cube([9.4, 3.55, 1.2], center=true);
        translate([-27.3, -30.5, -5.825]) rotate([90, 0, 0]) cube([11.4, 5.55, 1.2], center=true);

        //Opening for 1. Micro HDMI
        translate([-12.5, -29.5, -5.9]) rotate([90, 0, 0]) cube([7.9, 3.4, 1.2], center=true);
        translate([-12.5, -30.5, -5.9]) rotate([90, 0, 0]) cube([9.9, 5.4, 1.2], center=true);     
      
        //Opening for  2. Micro HDMI
        translate([1, -29.5, -5.9]) rotate([90, 0, 0]) cube([7.9, 3.4, 1.2], center=true);
        translate([1,  -30.5, -5.9]) rotate([90, 0, 0]) cube([9.9, 5.4, 1.2], center=true);

        //Opening for  Audio
        translate([15.5, -29.5, -4.6]) rotate([90, 0, 0]) cylinder(h = 2, r = 3.2, center=true);
        translate([15.5, -30.5, -4.4]) rotate([90, 0, 0]) cylinder(h = 1.2, r = 4.2, center=true);
    }  
}
